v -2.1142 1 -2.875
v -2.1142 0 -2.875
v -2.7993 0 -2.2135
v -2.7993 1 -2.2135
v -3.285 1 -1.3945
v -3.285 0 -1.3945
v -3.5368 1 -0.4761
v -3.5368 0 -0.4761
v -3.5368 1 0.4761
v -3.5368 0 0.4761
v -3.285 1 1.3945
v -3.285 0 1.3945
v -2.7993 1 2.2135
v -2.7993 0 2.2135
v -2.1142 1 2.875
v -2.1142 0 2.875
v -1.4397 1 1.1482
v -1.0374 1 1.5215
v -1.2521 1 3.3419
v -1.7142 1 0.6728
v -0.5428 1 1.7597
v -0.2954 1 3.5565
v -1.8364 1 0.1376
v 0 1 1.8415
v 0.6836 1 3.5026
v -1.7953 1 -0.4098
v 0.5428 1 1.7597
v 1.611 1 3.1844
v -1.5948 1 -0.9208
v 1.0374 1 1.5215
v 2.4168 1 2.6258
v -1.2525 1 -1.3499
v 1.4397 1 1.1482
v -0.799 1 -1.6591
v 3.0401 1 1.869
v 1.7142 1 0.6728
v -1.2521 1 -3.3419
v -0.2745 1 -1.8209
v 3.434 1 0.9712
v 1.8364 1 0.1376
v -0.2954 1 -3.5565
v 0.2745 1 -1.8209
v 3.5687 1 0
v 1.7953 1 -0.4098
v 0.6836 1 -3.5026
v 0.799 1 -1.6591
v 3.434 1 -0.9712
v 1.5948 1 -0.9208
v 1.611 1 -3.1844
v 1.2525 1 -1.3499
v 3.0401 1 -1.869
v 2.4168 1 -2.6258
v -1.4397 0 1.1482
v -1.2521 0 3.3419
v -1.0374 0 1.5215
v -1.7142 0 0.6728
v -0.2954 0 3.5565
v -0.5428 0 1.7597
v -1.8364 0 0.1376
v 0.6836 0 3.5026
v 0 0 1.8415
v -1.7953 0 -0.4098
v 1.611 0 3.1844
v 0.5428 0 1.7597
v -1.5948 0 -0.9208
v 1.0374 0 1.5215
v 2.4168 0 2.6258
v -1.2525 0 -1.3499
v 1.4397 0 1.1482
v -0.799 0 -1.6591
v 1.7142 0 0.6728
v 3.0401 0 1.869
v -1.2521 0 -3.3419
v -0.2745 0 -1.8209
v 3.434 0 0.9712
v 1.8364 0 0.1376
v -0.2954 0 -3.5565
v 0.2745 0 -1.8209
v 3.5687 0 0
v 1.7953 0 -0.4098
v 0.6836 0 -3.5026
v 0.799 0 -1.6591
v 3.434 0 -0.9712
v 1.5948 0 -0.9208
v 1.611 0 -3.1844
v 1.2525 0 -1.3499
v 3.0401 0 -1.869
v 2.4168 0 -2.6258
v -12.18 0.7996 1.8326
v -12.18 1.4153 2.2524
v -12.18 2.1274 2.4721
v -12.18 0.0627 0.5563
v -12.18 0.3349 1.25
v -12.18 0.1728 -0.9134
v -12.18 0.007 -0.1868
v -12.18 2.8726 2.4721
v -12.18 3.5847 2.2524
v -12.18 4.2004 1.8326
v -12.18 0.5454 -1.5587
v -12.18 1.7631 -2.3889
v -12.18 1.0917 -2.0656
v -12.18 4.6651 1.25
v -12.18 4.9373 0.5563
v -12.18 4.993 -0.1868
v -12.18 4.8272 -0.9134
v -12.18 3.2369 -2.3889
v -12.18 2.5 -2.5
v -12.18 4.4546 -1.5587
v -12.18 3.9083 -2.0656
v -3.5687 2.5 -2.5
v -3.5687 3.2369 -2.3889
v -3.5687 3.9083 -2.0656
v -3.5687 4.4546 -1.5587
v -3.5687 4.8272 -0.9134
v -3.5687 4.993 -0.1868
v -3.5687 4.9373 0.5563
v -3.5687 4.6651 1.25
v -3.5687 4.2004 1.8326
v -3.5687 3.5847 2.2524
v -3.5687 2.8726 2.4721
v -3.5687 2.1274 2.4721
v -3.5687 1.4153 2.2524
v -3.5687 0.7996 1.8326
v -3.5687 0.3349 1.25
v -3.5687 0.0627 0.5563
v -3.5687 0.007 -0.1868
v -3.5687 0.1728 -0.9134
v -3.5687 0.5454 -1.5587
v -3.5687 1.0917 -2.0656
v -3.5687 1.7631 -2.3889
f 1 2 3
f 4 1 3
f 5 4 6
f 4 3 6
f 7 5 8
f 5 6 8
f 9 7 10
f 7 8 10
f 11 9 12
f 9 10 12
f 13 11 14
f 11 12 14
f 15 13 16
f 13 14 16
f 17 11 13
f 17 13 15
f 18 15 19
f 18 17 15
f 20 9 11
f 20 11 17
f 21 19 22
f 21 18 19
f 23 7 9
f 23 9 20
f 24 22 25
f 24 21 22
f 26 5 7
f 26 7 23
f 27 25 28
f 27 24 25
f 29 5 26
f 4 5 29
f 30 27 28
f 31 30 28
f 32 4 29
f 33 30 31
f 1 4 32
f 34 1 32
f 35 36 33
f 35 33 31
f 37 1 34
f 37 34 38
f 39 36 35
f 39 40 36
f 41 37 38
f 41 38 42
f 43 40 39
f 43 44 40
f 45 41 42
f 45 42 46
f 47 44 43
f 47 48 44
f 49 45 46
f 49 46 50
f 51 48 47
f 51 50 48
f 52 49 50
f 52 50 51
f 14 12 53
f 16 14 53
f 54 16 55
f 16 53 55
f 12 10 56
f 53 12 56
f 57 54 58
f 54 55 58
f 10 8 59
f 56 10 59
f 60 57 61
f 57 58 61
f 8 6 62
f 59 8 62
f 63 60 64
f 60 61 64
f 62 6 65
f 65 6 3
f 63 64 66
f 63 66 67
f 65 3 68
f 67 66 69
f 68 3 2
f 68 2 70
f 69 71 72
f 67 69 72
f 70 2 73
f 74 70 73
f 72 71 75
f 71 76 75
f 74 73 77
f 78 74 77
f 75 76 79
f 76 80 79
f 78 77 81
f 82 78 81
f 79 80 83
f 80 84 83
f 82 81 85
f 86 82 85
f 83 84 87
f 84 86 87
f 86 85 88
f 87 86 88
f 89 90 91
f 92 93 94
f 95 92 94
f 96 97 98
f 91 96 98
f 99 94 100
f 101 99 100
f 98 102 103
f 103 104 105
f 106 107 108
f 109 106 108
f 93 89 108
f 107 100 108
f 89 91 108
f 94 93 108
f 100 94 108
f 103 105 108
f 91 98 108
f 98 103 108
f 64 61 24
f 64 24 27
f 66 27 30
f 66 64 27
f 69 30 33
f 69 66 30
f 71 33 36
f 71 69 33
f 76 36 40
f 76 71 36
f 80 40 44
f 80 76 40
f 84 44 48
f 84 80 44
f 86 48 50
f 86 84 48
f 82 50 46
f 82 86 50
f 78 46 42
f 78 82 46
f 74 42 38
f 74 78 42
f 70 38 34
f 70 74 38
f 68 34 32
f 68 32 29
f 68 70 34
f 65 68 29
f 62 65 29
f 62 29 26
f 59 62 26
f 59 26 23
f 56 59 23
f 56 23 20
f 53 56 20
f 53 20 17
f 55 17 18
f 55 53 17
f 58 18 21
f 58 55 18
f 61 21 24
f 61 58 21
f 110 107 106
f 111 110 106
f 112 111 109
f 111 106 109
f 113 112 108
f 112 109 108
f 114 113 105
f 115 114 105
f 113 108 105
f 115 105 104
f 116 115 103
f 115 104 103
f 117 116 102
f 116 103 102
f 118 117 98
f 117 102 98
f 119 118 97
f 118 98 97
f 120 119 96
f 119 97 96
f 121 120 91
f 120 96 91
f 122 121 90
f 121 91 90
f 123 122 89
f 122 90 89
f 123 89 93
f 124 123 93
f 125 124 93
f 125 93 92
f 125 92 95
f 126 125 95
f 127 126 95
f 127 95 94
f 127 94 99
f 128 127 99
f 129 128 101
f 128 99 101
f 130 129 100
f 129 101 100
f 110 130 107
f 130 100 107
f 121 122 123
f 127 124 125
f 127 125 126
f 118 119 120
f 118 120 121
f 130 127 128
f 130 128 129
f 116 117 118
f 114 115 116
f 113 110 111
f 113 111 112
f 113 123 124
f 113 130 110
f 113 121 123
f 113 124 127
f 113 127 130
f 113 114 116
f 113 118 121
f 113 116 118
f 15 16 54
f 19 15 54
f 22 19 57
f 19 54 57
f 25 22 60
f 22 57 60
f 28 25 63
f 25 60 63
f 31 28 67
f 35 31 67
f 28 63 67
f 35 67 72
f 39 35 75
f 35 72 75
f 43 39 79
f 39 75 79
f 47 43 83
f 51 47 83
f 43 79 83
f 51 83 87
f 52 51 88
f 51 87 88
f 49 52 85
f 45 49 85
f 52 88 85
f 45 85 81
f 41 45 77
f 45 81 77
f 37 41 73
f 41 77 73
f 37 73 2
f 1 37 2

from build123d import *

# Parameters (mm, degrees)
SKETCH18_R          = 2.5
BOSS_EXTRUDE4_DEPTH = 8.6113
SKETCH1_R           = 1.8415
BOSS_EXTRUDE5_DEPTH = 1


with BuildPart() as part:
    # Sketch18 → Boss-Extrude4 (new body)
    with BuildSketch(Plane(origin=(-12.18, 0, 0), x_dir=(0, 0, -1), z_dir=(1, 0, 0))):
        with Locations((0, 2.5)):
            Circle(SKETCH18_R)
    extrude(amount=BOSS_EXTRUDE4_DEPTH)


with BuildPart() as body_2:
    # Sketch1 → Boss-Extrude5 (new body)
    with BuildSketch(Plane(origin=(0, 0, 0), x_dir=(1, 0, 0), z_dir=(0, 1, 0))):
        with BuildLine():
            ThreePointArc((-2.114236195, -2.875), (3.5687, 0), (-2.114236195, 2.875))
            ThreePointArc((-2.114236195, 2.875), (-3.5687, 0), (-2.114236195, -2.875))
        make_face()
        with Locations(Location((0, 0, 0), (0, 0, 270))):
            Circle(SKETCH1_R, mode=Mode.SUBTRACT)
    extrude(amount=BOSS_EXTRUDE5_DEPTH)


solid = Compound([part.part, body_2.part])
